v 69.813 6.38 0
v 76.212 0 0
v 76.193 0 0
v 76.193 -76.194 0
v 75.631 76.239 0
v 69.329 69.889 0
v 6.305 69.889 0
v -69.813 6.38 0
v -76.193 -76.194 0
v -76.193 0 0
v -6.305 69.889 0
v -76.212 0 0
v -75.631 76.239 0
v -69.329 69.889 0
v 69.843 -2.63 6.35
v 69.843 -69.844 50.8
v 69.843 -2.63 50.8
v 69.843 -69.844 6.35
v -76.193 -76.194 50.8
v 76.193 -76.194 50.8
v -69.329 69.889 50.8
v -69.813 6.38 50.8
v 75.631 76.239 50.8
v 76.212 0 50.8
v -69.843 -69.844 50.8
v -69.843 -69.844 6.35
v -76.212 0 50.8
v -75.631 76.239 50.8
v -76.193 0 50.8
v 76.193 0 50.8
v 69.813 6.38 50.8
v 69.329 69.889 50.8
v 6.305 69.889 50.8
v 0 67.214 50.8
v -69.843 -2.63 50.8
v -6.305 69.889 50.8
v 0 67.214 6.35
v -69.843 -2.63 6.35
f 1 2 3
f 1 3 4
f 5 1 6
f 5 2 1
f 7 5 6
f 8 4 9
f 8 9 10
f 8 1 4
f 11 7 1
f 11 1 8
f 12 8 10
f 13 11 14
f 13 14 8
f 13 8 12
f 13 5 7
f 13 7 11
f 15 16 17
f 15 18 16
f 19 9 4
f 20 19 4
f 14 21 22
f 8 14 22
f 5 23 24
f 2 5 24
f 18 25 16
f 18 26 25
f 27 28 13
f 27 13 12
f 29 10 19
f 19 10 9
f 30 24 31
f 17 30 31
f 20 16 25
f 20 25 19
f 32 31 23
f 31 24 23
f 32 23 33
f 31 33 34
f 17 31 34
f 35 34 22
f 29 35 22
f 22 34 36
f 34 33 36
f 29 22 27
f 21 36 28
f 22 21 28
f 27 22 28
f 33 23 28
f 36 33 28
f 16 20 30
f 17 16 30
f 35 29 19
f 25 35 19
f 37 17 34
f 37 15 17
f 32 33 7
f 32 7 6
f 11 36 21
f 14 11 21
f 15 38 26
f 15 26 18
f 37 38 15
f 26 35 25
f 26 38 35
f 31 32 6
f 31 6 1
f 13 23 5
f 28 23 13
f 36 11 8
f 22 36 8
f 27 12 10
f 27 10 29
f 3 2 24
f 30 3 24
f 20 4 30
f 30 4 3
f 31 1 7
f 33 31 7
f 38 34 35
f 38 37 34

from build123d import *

# Parameters (mm, degrees)
F1_DEPTH = 50.8
F2_T     = -6.35
F4_E4_W  = 76.2411638441
F4_E4_H  = 50.8
F5_DEPTH = 6.35
F4_E3_W  = 75.6305083632
F4_E3_H  = 50.8
F6_DEPTH = 6.35


# Not quite as in the source:
# - a feature of the source that left no trace in its solid (it failed there, or was rolled back) is left out
# - a pattern or mirror of a feature is missing from the dataset's text; its kind, count and spacing are read off the source's solid


with BuildPart() as f1:
    # F0 (on Top) → F1 (new body)
    with BuildSketch(Plane.XY):
        Polygon((76.1932209134, 0), (0, 76.1944577098), (-76.1932209134, 0), (-76.1932209134, -76.1944577098), (76.1932209134, -76.1944577098), align=None)
    extrude(amount=F1_DEPTH)

    # F2
    f2_openings = [f1.faces().sort_by_distance(p)[0] for p in [
        (0, -16.932102, 50.8),
    ]]
    offset(amount=F2_T, openings=f2_openings)

    # F4_E4 (on explicit) → F5 (join)
    with BuildSketch(Plane(origin=(75.6305083632, 76.2389451265, 0), x_dir=(0.0076290083, -0.9999708987, 0), z_dir=(-0.9999708987, -0.0076290083, 0))):
        with Locations((38.120581922, 25.4)):
            Rectangle(F4_E4_W, F4_E4_H)
    f5 = extrude(amount=F5_DEPTH)

    # F5_copies: F5 across plane
    add(f5.mirror(Plane(origin=(0, 0, 0), x_dir=(0, 0, -1), z_dir=(-1, 0, 0))))

    # F4_E3 (on explicit) → F6 (join)
    with BuildSketch(Plane.XZ.offset(-76.2389451265)):
        with Locations((37.8152541816, 25.4)):
            Rectangle(F4_E3_W, F4_E3_H)
    f6 = extrude(amount=F6_DEPTH)

    # F6_copies: F6 across plane
    add(f6.mirror(Plane(origin=(0, 0, 0), x_dir=(0, 0, -1), z_dir=(-1, 0, 0))))


solid = f1.part
